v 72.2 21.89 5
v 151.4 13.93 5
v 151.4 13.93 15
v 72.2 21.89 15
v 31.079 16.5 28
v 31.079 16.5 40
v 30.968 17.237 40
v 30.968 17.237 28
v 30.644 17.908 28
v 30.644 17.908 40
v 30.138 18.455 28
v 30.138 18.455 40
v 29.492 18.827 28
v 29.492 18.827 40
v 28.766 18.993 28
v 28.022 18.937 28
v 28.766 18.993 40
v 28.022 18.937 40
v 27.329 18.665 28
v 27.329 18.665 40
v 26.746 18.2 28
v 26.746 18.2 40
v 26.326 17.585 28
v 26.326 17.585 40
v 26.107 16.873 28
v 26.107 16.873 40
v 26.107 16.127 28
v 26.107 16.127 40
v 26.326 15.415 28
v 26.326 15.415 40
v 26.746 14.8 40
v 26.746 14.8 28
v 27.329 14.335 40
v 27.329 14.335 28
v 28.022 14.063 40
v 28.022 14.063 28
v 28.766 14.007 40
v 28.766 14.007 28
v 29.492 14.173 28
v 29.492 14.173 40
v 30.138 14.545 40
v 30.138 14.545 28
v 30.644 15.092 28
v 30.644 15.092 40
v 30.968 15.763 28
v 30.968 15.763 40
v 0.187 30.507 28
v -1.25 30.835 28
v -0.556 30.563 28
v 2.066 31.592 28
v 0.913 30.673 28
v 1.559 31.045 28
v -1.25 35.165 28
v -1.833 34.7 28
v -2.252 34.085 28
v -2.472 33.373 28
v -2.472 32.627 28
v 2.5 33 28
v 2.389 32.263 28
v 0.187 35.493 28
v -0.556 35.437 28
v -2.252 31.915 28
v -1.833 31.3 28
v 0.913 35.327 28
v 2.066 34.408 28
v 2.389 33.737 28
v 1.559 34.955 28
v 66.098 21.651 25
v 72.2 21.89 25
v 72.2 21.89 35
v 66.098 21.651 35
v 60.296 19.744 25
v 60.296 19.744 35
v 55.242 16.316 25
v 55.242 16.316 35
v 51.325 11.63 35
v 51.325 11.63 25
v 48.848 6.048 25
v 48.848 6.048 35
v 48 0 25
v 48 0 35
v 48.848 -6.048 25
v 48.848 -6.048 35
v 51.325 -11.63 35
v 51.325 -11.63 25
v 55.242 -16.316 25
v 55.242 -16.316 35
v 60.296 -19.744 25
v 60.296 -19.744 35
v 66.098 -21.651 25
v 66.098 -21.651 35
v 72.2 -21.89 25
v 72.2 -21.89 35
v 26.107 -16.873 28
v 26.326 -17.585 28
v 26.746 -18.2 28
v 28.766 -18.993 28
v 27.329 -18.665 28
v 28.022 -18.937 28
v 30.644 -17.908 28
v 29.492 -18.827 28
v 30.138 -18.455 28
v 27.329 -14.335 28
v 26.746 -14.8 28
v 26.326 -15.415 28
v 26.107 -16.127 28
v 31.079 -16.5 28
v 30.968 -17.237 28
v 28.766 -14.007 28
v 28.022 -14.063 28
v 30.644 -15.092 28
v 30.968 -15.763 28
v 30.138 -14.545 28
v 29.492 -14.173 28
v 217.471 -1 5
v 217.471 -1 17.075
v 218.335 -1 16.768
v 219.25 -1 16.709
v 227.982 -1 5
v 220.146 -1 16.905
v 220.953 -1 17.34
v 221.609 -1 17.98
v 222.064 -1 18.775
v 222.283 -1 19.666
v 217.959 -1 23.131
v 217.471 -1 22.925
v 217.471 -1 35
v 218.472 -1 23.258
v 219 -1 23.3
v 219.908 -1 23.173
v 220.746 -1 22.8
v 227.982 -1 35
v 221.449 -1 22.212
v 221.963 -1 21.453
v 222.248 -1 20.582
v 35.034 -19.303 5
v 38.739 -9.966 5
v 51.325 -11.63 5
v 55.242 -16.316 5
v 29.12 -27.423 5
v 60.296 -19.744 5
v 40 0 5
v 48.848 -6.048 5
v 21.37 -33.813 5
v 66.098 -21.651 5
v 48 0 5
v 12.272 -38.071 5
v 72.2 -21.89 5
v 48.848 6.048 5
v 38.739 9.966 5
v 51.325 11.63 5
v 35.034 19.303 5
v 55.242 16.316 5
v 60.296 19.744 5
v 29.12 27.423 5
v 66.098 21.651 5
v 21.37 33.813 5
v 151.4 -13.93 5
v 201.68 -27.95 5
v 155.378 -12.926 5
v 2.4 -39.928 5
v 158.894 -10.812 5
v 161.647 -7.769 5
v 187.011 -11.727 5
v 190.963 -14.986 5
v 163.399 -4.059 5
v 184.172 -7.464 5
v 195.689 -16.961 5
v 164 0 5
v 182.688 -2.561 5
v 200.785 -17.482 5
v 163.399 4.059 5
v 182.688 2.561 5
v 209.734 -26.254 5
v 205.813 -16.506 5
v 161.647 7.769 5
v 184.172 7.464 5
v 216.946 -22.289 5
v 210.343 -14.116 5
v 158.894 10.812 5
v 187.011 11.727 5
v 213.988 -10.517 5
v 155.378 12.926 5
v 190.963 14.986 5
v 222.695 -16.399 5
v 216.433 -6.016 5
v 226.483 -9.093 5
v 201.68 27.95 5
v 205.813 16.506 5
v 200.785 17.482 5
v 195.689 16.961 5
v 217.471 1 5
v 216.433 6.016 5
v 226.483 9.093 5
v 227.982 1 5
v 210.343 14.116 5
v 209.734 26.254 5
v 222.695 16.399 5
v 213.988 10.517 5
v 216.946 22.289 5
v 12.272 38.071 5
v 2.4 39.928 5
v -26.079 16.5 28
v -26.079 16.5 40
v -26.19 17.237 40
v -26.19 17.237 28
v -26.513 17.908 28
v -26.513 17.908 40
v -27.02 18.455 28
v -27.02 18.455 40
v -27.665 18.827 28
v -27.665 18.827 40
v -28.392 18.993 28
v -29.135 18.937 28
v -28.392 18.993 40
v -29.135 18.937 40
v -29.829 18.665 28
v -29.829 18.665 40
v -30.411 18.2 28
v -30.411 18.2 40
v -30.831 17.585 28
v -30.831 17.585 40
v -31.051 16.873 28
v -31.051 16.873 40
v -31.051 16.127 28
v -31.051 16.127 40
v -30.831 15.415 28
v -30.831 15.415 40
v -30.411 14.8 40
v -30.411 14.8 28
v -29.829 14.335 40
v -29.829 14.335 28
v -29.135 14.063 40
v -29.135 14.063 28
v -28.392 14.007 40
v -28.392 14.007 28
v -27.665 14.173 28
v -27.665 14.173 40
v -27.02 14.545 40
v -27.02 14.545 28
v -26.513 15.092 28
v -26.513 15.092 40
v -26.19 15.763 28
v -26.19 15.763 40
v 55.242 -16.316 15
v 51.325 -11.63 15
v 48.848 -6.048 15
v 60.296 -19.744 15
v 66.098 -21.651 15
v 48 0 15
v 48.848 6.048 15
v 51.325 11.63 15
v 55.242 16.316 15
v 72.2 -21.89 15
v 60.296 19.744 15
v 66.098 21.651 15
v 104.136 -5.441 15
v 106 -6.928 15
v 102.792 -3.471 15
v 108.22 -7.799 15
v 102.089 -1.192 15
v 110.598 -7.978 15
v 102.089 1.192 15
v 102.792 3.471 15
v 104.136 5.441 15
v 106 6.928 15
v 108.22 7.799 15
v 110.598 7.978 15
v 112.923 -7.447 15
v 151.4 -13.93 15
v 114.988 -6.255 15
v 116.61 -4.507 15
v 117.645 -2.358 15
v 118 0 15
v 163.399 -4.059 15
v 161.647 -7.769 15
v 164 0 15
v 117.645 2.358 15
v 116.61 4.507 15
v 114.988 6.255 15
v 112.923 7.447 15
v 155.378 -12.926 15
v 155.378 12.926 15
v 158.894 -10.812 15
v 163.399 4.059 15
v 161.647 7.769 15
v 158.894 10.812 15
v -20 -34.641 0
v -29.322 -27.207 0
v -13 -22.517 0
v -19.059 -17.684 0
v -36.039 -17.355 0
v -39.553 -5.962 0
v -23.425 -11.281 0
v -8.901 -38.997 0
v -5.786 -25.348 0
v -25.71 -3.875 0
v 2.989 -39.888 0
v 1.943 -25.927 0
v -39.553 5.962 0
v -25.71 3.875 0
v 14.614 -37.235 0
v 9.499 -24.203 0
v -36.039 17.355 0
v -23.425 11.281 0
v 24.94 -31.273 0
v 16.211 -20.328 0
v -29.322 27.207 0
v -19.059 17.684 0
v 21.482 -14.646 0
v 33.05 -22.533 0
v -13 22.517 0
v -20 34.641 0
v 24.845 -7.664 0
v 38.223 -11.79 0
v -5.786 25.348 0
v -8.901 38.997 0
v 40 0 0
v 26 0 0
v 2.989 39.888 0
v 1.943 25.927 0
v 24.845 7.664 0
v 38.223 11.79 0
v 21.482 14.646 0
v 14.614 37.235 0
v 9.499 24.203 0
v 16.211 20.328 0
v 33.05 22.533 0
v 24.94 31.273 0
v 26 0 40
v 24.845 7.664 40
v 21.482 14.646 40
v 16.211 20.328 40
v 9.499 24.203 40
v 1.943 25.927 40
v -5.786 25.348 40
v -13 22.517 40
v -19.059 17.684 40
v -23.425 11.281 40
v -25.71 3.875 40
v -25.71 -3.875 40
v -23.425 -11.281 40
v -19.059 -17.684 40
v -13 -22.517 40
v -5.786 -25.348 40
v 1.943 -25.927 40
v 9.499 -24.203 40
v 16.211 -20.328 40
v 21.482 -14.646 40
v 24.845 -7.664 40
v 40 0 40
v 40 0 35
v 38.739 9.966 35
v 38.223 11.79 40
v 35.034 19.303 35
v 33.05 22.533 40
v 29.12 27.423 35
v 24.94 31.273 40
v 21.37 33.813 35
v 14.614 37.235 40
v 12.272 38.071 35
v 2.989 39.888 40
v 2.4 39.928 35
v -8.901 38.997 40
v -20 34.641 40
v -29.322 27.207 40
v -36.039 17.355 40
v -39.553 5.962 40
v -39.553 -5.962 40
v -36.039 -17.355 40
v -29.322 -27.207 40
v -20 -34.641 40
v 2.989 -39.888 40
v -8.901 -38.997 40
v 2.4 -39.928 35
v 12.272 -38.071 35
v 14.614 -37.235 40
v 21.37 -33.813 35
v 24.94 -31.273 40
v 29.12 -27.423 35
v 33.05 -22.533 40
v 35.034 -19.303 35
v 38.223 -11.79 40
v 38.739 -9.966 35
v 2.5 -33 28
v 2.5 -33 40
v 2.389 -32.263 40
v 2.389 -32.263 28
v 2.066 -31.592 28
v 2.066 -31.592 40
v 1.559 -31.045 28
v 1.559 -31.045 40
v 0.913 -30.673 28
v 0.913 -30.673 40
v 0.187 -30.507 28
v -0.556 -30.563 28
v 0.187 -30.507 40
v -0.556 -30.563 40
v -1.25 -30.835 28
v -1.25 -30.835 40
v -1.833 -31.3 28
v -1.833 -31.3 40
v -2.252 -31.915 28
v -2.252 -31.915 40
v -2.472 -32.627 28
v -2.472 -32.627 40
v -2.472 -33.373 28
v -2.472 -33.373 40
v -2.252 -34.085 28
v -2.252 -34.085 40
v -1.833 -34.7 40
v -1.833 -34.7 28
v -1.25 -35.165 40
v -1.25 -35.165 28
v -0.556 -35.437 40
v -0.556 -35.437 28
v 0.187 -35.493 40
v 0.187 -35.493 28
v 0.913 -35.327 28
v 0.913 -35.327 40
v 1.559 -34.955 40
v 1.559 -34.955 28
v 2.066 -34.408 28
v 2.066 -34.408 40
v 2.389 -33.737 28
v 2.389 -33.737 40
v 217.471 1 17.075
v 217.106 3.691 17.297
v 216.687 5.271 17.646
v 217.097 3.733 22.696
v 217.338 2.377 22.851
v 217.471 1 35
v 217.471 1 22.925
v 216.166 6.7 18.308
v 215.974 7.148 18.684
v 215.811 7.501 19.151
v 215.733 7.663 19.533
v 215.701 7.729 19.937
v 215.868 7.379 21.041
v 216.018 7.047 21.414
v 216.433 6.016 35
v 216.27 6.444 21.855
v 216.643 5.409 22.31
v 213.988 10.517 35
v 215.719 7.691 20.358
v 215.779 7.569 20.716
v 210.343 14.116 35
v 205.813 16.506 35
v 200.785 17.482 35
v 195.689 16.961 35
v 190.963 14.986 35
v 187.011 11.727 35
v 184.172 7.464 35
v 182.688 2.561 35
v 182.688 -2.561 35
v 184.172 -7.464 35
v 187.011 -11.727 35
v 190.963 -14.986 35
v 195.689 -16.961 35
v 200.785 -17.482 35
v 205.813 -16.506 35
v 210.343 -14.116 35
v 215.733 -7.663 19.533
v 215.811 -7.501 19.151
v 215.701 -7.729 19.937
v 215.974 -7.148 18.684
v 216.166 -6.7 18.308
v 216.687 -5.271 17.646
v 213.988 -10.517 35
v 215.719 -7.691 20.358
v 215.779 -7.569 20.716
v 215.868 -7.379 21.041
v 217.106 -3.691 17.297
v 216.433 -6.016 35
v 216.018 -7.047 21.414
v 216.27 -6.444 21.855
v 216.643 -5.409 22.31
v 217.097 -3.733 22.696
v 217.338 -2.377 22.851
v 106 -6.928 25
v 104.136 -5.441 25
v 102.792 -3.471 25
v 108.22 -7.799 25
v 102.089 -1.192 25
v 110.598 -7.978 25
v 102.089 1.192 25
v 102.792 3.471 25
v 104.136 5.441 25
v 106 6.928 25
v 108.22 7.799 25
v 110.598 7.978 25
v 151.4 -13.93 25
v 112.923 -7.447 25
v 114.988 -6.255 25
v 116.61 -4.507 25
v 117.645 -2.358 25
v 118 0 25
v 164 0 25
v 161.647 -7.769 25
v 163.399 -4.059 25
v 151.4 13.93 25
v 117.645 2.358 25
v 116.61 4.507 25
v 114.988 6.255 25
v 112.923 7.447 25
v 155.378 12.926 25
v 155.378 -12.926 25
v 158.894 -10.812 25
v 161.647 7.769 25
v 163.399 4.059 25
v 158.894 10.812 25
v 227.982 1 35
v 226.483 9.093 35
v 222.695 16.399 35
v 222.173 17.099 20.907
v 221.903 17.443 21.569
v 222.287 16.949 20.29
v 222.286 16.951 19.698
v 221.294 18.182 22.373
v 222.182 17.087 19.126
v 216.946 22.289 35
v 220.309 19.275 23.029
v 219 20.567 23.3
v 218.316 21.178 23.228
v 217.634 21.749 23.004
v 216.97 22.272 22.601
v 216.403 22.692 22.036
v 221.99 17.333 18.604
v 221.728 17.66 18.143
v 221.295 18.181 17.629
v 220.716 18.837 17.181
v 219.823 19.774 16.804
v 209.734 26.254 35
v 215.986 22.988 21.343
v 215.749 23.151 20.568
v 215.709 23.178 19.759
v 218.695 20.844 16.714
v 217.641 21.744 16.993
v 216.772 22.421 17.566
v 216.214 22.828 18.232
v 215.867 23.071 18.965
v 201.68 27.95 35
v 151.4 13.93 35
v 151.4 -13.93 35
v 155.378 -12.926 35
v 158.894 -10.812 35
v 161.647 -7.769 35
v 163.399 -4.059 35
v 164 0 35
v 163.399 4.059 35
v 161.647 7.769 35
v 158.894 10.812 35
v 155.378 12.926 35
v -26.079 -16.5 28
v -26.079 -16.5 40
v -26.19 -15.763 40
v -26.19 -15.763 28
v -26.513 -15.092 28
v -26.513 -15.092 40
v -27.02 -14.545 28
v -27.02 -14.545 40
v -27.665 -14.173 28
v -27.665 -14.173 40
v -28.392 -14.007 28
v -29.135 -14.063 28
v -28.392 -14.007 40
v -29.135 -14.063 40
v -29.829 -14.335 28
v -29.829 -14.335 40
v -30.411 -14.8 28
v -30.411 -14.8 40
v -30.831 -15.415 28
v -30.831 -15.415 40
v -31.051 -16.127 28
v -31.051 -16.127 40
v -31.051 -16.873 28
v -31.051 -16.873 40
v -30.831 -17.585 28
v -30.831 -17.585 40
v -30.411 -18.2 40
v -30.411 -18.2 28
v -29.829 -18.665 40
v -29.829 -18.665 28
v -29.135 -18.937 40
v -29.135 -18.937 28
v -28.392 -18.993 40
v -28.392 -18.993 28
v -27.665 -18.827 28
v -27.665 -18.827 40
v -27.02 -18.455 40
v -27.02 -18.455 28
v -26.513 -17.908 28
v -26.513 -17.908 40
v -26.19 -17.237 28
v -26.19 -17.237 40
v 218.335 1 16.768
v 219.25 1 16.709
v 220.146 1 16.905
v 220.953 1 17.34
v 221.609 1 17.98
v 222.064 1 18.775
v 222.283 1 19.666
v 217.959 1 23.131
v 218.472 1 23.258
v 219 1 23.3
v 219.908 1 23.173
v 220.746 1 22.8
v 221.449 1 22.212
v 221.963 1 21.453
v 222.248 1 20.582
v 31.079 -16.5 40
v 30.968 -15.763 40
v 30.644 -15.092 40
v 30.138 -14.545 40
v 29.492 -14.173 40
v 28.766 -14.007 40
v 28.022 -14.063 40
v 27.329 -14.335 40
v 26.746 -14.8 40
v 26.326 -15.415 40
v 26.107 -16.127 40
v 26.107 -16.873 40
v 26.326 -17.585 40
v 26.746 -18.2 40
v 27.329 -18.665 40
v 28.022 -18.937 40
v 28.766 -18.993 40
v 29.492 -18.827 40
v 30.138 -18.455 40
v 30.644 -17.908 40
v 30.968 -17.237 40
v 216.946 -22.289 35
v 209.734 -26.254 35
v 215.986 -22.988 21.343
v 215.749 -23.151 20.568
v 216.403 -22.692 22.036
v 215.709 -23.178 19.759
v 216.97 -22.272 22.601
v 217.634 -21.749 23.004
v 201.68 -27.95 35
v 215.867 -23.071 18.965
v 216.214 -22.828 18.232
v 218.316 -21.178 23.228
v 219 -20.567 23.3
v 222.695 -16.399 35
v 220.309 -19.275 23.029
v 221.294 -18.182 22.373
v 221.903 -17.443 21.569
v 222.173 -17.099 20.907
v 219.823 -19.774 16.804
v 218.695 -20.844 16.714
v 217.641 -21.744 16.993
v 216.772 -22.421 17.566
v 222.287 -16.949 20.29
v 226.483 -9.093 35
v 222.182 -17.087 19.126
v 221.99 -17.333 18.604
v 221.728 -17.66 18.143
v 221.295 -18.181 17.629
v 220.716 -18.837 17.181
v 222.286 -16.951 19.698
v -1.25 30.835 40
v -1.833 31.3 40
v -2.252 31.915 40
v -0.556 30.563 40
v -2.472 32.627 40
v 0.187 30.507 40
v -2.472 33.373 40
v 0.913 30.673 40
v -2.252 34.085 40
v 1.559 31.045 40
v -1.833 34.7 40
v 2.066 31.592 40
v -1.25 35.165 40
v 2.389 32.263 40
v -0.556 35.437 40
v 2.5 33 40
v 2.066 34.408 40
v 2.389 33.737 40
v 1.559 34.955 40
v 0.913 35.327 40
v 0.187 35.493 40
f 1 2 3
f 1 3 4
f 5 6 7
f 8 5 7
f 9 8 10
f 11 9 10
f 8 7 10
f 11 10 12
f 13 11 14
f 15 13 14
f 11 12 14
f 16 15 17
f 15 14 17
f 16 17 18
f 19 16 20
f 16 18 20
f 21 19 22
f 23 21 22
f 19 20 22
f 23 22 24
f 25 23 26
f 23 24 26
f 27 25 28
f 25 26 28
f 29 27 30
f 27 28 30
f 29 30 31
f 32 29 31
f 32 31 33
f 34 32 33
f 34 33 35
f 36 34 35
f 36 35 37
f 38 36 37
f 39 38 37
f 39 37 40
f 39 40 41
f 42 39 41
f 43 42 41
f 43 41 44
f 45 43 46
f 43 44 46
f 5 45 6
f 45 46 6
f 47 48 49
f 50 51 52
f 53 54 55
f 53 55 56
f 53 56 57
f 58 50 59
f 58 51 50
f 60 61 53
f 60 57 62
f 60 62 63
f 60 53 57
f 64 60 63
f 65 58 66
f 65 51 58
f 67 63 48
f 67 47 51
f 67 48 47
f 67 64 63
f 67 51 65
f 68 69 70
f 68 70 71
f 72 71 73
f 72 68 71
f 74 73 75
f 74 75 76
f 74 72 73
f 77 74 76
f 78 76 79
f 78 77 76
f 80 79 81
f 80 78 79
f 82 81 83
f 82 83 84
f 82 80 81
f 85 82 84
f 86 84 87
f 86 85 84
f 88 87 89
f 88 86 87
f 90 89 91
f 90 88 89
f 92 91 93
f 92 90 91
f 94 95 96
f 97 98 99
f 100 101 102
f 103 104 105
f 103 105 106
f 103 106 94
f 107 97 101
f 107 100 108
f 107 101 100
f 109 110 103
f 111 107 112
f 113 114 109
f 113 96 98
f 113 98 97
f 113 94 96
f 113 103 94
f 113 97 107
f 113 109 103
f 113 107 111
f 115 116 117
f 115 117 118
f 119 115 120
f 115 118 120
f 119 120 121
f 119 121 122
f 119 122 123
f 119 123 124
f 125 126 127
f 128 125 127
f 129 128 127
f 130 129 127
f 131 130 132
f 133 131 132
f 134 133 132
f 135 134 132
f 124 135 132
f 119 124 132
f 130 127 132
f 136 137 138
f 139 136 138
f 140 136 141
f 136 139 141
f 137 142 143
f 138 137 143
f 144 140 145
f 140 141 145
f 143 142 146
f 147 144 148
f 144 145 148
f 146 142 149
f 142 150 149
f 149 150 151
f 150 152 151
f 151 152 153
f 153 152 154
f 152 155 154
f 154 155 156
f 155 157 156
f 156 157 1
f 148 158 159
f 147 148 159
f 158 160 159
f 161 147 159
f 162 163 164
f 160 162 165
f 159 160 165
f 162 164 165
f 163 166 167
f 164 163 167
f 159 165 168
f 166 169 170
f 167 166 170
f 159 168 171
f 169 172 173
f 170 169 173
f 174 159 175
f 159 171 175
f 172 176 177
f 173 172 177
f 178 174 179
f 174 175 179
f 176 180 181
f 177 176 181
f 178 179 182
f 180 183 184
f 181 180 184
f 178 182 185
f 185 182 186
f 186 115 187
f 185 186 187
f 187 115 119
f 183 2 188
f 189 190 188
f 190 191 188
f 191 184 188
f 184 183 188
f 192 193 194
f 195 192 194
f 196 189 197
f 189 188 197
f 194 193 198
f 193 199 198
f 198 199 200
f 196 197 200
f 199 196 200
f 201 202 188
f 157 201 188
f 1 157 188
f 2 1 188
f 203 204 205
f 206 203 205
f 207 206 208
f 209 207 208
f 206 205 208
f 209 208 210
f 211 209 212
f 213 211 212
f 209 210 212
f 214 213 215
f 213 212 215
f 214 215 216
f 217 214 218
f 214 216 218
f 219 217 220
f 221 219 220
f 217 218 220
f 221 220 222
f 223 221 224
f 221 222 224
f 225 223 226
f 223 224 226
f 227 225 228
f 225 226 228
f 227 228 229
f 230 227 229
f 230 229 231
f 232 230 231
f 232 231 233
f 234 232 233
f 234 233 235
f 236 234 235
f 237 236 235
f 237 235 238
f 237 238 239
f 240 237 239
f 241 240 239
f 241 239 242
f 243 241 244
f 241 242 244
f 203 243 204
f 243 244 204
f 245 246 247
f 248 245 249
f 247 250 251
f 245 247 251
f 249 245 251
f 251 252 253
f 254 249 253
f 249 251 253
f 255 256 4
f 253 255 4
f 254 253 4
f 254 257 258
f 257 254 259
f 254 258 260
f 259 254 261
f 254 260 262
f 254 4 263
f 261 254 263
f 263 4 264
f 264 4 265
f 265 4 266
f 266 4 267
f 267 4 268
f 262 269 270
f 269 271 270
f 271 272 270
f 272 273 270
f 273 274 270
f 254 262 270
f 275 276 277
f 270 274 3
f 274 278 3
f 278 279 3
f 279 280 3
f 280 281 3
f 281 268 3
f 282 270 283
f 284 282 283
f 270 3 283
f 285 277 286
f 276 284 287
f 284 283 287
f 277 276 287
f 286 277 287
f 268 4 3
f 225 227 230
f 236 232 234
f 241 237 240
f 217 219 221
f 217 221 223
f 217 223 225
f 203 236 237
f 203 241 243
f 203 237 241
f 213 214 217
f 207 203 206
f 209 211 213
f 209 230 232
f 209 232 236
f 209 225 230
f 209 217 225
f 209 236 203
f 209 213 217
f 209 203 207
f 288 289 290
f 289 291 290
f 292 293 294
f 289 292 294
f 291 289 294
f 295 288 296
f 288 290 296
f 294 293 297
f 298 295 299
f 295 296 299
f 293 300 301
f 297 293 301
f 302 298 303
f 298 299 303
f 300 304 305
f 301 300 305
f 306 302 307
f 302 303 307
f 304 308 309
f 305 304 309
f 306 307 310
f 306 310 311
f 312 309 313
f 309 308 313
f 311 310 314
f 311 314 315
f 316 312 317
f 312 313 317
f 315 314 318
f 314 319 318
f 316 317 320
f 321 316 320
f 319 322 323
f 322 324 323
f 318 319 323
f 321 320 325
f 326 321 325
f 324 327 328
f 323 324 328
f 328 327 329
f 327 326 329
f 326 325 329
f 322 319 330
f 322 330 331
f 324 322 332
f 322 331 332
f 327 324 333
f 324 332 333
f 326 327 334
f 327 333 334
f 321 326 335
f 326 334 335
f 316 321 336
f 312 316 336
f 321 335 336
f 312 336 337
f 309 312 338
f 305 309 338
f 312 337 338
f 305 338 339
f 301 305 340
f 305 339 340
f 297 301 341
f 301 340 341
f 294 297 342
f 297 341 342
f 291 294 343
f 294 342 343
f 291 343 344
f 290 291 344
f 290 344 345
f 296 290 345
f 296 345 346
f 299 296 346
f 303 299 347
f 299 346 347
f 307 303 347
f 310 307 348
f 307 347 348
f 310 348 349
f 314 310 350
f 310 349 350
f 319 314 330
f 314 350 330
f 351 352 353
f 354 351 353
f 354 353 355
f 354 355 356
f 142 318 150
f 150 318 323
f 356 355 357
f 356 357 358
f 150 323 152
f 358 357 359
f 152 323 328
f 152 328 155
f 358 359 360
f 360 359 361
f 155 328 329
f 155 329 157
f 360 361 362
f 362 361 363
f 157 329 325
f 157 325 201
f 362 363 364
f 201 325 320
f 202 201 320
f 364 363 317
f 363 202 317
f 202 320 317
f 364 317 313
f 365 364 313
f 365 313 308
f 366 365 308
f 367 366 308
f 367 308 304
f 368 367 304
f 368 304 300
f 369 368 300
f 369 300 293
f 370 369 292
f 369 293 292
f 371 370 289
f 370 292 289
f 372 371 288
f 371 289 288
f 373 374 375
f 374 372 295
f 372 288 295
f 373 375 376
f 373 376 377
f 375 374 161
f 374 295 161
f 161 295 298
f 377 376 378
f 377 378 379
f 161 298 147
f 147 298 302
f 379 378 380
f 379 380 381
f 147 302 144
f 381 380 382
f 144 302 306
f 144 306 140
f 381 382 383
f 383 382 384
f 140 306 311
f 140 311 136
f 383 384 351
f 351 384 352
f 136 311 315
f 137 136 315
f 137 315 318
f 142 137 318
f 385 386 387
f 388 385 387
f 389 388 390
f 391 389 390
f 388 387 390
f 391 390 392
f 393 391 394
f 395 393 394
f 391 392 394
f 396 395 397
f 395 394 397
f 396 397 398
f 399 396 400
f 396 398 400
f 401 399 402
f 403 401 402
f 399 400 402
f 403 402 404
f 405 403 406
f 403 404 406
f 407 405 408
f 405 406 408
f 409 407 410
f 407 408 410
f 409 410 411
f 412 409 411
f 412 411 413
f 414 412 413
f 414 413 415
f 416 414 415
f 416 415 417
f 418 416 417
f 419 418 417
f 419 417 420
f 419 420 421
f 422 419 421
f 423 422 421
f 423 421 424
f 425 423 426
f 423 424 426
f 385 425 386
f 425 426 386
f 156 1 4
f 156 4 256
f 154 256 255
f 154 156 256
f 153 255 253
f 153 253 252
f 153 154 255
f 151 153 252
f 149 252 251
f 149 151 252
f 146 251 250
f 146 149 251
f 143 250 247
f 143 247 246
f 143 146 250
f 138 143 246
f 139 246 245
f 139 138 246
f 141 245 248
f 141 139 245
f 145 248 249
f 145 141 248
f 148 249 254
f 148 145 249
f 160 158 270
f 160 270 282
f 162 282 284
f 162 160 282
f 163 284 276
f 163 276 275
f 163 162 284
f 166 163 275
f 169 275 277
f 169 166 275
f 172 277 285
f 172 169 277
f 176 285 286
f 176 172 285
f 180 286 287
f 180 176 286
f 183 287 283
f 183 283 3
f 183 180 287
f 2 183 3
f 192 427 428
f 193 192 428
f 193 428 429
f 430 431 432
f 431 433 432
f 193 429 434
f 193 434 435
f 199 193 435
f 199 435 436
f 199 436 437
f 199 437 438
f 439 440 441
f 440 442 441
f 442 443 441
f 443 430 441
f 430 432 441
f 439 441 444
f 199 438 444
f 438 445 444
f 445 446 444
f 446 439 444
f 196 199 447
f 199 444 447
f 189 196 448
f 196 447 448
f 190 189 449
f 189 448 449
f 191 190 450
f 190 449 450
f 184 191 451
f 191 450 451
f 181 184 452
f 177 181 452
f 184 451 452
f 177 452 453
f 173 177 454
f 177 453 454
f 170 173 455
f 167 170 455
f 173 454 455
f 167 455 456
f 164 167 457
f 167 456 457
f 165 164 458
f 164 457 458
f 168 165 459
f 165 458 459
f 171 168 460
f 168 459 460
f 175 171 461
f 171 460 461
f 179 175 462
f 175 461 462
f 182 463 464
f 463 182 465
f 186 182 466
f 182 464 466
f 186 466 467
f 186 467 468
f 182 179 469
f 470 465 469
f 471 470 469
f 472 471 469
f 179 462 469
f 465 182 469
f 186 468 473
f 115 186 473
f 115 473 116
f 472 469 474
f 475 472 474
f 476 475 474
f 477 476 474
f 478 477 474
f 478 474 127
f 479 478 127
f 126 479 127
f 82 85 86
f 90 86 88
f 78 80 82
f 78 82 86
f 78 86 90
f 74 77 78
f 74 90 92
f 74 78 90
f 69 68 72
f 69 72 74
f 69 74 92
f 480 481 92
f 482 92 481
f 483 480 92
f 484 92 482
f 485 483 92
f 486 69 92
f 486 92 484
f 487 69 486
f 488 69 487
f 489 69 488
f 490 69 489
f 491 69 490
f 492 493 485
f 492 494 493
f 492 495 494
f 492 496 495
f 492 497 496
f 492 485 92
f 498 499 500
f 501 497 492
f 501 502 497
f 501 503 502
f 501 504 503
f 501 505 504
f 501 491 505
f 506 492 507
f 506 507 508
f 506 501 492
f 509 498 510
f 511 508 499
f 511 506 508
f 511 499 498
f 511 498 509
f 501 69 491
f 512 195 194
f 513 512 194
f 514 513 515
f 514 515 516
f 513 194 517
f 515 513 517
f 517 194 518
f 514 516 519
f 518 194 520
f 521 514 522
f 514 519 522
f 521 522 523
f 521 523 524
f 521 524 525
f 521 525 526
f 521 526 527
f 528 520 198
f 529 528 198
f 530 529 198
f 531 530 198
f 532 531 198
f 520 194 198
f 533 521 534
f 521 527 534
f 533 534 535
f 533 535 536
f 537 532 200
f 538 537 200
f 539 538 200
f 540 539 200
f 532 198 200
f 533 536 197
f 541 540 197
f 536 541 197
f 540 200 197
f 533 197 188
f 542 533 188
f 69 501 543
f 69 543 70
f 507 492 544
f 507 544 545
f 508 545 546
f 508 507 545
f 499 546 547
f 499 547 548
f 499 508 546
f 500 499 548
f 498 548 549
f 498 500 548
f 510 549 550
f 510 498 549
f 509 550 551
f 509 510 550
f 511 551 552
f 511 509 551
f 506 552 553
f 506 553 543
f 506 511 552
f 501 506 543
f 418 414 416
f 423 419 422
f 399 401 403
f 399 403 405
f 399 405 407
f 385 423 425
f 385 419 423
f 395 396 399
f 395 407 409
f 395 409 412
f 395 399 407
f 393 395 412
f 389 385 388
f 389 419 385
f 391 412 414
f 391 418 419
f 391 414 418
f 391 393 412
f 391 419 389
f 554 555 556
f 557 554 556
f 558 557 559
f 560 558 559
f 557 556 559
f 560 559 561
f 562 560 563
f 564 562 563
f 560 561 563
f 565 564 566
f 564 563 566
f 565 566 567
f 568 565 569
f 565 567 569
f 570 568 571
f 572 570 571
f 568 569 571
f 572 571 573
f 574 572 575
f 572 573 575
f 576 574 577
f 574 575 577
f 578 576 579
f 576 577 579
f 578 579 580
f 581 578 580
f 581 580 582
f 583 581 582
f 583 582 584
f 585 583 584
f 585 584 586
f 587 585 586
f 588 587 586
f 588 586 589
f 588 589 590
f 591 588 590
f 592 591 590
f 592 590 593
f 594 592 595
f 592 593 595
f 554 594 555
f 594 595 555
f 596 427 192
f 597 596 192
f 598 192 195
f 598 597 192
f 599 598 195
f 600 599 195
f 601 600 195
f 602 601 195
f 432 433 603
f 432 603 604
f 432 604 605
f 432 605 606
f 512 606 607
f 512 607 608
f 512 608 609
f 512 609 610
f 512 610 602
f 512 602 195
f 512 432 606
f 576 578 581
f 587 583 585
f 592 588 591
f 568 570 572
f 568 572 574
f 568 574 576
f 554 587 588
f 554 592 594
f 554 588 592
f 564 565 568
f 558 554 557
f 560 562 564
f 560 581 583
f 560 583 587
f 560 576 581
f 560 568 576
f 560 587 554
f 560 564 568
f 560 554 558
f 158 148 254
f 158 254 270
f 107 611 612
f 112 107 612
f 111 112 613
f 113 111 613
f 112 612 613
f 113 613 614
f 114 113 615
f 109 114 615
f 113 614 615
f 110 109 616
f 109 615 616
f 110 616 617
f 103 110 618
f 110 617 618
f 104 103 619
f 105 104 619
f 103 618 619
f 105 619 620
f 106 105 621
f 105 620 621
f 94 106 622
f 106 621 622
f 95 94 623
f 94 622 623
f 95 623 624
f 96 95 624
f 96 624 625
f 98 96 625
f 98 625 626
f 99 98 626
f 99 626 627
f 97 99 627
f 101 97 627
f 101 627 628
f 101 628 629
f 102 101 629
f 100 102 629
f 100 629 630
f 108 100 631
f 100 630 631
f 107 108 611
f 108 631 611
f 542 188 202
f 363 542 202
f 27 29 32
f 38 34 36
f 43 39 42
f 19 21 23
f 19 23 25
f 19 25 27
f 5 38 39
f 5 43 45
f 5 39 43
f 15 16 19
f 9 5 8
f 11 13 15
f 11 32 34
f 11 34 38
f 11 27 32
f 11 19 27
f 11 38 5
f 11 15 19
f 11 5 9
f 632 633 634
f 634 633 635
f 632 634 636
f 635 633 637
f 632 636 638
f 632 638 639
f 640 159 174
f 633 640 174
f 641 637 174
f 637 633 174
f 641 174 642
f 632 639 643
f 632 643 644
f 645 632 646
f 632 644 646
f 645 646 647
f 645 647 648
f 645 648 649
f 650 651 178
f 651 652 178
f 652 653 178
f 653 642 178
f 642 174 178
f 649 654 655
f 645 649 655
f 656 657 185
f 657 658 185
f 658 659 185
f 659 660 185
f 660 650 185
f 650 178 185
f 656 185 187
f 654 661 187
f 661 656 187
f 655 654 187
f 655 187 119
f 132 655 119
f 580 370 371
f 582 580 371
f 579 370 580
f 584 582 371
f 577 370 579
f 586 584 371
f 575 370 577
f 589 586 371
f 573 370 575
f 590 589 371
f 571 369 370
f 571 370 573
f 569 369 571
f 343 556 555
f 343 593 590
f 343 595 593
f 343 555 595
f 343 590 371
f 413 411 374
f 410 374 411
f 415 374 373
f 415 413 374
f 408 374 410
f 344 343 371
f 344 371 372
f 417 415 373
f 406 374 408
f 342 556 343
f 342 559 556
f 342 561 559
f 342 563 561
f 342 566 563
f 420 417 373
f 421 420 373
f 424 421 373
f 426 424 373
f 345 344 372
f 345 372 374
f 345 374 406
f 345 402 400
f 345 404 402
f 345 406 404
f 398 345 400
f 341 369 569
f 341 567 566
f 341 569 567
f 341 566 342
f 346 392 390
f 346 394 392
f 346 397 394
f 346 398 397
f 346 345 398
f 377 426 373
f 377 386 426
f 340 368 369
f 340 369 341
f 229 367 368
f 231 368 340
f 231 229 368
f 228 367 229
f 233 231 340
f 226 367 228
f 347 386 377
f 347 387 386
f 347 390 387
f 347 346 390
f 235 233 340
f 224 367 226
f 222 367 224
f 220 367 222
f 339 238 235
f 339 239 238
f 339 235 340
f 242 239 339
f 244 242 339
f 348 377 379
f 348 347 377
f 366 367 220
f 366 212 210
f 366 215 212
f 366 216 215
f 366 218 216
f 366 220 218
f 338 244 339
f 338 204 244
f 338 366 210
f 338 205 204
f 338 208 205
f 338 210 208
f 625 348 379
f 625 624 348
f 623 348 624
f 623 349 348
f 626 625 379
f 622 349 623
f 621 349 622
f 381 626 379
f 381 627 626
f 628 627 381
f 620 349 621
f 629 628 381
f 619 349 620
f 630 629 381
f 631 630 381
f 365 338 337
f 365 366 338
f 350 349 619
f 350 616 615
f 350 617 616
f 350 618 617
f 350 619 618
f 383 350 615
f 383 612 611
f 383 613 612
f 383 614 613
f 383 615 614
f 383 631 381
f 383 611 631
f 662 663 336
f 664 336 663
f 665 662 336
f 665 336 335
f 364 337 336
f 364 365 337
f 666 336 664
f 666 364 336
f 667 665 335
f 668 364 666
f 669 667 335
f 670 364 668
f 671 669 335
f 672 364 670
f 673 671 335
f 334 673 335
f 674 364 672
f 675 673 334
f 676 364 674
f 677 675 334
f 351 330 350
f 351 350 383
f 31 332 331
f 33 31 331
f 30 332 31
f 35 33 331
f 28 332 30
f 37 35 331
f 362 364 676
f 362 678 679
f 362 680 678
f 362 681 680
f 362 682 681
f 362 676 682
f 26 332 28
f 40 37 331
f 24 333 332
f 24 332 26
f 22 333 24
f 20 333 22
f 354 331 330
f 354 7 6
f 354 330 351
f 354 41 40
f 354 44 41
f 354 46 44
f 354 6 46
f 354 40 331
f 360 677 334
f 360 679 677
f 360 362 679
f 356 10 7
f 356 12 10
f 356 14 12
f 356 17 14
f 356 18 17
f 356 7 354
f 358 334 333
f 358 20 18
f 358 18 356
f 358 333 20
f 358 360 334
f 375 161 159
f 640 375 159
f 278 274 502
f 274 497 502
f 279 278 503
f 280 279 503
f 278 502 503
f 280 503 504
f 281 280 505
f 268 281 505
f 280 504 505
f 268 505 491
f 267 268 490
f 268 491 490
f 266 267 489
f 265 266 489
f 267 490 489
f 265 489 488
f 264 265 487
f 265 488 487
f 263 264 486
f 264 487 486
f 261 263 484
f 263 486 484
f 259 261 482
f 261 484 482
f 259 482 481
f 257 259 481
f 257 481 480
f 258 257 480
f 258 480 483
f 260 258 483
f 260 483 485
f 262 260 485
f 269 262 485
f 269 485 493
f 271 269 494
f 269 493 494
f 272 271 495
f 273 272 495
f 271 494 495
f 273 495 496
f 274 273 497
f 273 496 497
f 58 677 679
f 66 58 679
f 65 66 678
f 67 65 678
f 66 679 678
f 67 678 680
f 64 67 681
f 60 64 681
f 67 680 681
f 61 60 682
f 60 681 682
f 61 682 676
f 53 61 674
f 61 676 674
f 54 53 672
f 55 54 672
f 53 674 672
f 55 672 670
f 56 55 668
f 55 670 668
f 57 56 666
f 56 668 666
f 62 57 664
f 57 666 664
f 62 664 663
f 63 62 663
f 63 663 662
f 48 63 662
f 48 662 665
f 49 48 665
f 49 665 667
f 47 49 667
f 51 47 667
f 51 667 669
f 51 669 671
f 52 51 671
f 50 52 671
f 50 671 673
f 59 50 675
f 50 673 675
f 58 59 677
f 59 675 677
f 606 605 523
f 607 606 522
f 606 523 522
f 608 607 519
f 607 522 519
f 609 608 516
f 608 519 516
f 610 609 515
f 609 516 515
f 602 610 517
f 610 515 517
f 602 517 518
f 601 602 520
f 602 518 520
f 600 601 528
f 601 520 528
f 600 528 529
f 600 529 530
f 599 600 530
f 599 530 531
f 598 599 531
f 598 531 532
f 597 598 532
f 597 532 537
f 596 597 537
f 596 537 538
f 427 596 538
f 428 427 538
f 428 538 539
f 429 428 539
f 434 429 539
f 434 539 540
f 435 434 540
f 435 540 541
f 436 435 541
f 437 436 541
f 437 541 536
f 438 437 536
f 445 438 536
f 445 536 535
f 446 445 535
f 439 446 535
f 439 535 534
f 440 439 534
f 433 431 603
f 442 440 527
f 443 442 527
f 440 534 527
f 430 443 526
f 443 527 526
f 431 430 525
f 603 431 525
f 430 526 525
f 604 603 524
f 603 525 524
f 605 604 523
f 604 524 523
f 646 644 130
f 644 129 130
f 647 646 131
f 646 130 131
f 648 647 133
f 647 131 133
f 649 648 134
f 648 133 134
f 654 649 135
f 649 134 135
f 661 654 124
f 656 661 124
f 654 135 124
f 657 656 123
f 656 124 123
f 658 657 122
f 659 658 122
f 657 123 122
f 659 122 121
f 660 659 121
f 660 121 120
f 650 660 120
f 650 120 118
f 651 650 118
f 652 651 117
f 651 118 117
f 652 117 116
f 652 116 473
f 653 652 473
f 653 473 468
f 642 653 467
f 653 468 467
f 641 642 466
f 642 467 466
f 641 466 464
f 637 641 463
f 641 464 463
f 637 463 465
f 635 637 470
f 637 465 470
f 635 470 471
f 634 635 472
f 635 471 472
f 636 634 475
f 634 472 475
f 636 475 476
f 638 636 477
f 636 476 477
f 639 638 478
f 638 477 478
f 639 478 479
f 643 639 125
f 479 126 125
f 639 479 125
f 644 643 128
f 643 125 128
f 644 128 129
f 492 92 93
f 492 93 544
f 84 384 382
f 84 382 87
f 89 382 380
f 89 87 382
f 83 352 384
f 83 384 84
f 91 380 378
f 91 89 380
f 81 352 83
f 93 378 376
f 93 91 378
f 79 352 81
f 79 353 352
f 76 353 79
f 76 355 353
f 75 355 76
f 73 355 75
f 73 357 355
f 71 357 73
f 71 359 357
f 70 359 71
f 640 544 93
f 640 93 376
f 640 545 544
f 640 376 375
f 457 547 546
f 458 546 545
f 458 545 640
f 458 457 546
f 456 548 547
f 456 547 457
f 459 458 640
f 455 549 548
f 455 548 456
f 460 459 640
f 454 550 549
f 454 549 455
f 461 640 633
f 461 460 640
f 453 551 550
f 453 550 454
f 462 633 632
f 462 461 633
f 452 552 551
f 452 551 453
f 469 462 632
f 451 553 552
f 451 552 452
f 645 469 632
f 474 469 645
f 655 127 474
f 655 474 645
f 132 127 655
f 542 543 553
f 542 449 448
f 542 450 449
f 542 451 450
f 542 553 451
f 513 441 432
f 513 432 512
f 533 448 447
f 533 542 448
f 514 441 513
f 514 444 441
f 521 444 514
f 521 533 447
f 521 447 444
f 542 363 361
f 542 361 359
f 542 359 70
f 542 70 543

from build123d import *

# Parameters (mm, degrees)
EXTRUDE_1_DEPTH      = 30
SKETCH_2_R           = 40
EXTRUDE_2_DEPTH      = 40
CUT_EXTRUDE_1_DEPTH  = 10
CUT_EXTRUDE_2_DEPTH  = 10
SKETCH_5_R           = 26
CUT_EXTRUDE_3_DEPTH  = 269
SKETCH_6_R           = 17.5
CUT_EXTRUDE_4_DEPTH  = 269
SKETCH_7_R           = 8
CUT_EXTRUDE_5_DEPTH  = 269
SKETCH_9_W           = 30
SKETCH_9_H           = 2
CUT_EXTRUDE_8_DEPTH  = 269
SKETCH_10_R          = 2.5
CUT_EXTRUDE_9_DEPTH  = 12
SKETCH_11_R          = 3.3
CUT_EXTRUDE_10_DEPTH = 268.982


with BuildPart() as part:
    # 草图1 → 凸台-拉伸1 (new body)
    with BuildSketch(Plane.XY.offset(5)):
        with BuildLine():
            Line((2.4, -39.927935083), (201.68, -27.949554558))
            ThreePointArc((201.68, -27.949554558), (228, 0), (201.68, 27.949554558))
            Line((201.68, 27.949554558), (2.4, 39.927935083))
            ThreePointArc((2.4, 39.927935083), (-40, 0), (2.4, -39.927935083))
        make_face()
    extrude(amount=EXTRUDE_1_DEPTH)

    # 草图2 → 凸台-拉伸2 (add)
    with BuildSketch(Plane.XY):
        Circle(SKETCH_2_R)
    extrude(amount=EXTRUDE_2_DEPTH)

    # 草图3 → 切除-拉伸1 (cut)
    with BuildSketch(Plane.XY.offset(25)):
        with BuildLine():
            Line((72.2, -21.889723616), (151.4, -13.929824119))
            ThreePointArc((151.4, -13.929824119), (164, 0), (151.4, 13.929824119))
            Line((151.4, 13.929824119), (72.2, 21.889723616))
            ThreePointArc((72.2, 21.889723616), (48, 0), (72.2, -21.889723616))
        make_face()
    extrude(amount=CUT_EXTRUDE_1_DEPTH, mode=Mode.SUBTRACT)

    # 草图4 → 切除-拉伸2 (cut)
    with BuildSketch(Plane.XY.offset(5)):
        with BuildLine():
            Line((72.2, -21.889723616), (151.4, -13.929824119))
            ThreePointArc((151.4, -13.929824119), (164, 0), (151.4, 13.929824119))
            Line((151.4, 13.929824119), (72.2, 21.889723616))
            ThreePointArc((72.2, 21.889723616), (48, 0), (72.2, -21.889723616))
        make_face()
    extrude(amount=CUT_EXTRUDE_2_DEPTH, mode=Mode.SUBTRACT)

    # 草图5 → 切除-拉伸3 (cut, symmetric)
    with BuildSketch(Plane.XY):
        Circle(SKETCH_5_R)
    extrude(amount=CUT_EXTRUDE_3_DEPTH, both=True, mode=Mode.SUBTRACT)

    # 草图6 → 切除-拉伸4 (cut, symmetric)
    with BuildSketch(Plane.XY):
        with Locations((200, 0)):
            Circle(SKETCH_6_R)
    extrude(amount=CUT_EXTRUDE_4_DEPTH, both=True, mode=Mode.SUBTRACT)

    # 草图7 → 切除-拉伸5 (cut, symmetric)
    with BuildSketch(Plane.XY.offset(15)):
        with Locations((110, 0)):
            Circle(SKETCH_7_R)
    extrude(amount=CUT_EXTRUDE_5_DEPTH, both=True, mode=Mode.SUBTRACT)

    # 草图9 → 切除-拉伸8 (cut, symmetric)
    with BuildSketch(Plane.XY.offset(20)):
        with Locations((215, 0)):
            Rectangle(SKETCH_9_W, SKETCH_9_H)
    extrude(amount=CUT_EXTRUDE_8_DEPTH, both=True, mode=Mode.SUBTRACT)

    # 草图10 → 切除-拉伸9 (cut)
    with BuildSketch(Plane.XY.offset(40)):
        with Locations((28.5788, 16.5)):
            Circle(SKETCH_10_R)
        with Locations((0, 33)):
            Circle(SKETCH_10_R)
        with Locations((-28.5788, 16.5)):
            Circle(SKETCH_10_R)
        with Locations((-28.5788, -16.5)):
            Circle(SKETCH_10_R)
        with Locations((0, -33)):
            Circle(SKETCH_10_R)
        with Locations((28.5788, -16.5)):
            Circle(SKETCH_10_R)
    extrude(amount=-CUT_EXTRUDE_9_DEPTH, mode=Mode.SUBTRACT)

    # 草图11 → 切除-拉伸10 (cut, symmetric)
    with BuildSketch(Plane(origin=(0, 0, 0), x_dir=(1, 0, 0), z_dir=(0, 1, 0))):
        with Locations(Location((219, -20, 0), (0, 0, 270))):
            Circle(SKETCH_11_R)
    extrude(amount=CUT_EXTRUDE_10_DEPTH, both=True, mode=Mode.SUBTRACT)


solid = part.part
